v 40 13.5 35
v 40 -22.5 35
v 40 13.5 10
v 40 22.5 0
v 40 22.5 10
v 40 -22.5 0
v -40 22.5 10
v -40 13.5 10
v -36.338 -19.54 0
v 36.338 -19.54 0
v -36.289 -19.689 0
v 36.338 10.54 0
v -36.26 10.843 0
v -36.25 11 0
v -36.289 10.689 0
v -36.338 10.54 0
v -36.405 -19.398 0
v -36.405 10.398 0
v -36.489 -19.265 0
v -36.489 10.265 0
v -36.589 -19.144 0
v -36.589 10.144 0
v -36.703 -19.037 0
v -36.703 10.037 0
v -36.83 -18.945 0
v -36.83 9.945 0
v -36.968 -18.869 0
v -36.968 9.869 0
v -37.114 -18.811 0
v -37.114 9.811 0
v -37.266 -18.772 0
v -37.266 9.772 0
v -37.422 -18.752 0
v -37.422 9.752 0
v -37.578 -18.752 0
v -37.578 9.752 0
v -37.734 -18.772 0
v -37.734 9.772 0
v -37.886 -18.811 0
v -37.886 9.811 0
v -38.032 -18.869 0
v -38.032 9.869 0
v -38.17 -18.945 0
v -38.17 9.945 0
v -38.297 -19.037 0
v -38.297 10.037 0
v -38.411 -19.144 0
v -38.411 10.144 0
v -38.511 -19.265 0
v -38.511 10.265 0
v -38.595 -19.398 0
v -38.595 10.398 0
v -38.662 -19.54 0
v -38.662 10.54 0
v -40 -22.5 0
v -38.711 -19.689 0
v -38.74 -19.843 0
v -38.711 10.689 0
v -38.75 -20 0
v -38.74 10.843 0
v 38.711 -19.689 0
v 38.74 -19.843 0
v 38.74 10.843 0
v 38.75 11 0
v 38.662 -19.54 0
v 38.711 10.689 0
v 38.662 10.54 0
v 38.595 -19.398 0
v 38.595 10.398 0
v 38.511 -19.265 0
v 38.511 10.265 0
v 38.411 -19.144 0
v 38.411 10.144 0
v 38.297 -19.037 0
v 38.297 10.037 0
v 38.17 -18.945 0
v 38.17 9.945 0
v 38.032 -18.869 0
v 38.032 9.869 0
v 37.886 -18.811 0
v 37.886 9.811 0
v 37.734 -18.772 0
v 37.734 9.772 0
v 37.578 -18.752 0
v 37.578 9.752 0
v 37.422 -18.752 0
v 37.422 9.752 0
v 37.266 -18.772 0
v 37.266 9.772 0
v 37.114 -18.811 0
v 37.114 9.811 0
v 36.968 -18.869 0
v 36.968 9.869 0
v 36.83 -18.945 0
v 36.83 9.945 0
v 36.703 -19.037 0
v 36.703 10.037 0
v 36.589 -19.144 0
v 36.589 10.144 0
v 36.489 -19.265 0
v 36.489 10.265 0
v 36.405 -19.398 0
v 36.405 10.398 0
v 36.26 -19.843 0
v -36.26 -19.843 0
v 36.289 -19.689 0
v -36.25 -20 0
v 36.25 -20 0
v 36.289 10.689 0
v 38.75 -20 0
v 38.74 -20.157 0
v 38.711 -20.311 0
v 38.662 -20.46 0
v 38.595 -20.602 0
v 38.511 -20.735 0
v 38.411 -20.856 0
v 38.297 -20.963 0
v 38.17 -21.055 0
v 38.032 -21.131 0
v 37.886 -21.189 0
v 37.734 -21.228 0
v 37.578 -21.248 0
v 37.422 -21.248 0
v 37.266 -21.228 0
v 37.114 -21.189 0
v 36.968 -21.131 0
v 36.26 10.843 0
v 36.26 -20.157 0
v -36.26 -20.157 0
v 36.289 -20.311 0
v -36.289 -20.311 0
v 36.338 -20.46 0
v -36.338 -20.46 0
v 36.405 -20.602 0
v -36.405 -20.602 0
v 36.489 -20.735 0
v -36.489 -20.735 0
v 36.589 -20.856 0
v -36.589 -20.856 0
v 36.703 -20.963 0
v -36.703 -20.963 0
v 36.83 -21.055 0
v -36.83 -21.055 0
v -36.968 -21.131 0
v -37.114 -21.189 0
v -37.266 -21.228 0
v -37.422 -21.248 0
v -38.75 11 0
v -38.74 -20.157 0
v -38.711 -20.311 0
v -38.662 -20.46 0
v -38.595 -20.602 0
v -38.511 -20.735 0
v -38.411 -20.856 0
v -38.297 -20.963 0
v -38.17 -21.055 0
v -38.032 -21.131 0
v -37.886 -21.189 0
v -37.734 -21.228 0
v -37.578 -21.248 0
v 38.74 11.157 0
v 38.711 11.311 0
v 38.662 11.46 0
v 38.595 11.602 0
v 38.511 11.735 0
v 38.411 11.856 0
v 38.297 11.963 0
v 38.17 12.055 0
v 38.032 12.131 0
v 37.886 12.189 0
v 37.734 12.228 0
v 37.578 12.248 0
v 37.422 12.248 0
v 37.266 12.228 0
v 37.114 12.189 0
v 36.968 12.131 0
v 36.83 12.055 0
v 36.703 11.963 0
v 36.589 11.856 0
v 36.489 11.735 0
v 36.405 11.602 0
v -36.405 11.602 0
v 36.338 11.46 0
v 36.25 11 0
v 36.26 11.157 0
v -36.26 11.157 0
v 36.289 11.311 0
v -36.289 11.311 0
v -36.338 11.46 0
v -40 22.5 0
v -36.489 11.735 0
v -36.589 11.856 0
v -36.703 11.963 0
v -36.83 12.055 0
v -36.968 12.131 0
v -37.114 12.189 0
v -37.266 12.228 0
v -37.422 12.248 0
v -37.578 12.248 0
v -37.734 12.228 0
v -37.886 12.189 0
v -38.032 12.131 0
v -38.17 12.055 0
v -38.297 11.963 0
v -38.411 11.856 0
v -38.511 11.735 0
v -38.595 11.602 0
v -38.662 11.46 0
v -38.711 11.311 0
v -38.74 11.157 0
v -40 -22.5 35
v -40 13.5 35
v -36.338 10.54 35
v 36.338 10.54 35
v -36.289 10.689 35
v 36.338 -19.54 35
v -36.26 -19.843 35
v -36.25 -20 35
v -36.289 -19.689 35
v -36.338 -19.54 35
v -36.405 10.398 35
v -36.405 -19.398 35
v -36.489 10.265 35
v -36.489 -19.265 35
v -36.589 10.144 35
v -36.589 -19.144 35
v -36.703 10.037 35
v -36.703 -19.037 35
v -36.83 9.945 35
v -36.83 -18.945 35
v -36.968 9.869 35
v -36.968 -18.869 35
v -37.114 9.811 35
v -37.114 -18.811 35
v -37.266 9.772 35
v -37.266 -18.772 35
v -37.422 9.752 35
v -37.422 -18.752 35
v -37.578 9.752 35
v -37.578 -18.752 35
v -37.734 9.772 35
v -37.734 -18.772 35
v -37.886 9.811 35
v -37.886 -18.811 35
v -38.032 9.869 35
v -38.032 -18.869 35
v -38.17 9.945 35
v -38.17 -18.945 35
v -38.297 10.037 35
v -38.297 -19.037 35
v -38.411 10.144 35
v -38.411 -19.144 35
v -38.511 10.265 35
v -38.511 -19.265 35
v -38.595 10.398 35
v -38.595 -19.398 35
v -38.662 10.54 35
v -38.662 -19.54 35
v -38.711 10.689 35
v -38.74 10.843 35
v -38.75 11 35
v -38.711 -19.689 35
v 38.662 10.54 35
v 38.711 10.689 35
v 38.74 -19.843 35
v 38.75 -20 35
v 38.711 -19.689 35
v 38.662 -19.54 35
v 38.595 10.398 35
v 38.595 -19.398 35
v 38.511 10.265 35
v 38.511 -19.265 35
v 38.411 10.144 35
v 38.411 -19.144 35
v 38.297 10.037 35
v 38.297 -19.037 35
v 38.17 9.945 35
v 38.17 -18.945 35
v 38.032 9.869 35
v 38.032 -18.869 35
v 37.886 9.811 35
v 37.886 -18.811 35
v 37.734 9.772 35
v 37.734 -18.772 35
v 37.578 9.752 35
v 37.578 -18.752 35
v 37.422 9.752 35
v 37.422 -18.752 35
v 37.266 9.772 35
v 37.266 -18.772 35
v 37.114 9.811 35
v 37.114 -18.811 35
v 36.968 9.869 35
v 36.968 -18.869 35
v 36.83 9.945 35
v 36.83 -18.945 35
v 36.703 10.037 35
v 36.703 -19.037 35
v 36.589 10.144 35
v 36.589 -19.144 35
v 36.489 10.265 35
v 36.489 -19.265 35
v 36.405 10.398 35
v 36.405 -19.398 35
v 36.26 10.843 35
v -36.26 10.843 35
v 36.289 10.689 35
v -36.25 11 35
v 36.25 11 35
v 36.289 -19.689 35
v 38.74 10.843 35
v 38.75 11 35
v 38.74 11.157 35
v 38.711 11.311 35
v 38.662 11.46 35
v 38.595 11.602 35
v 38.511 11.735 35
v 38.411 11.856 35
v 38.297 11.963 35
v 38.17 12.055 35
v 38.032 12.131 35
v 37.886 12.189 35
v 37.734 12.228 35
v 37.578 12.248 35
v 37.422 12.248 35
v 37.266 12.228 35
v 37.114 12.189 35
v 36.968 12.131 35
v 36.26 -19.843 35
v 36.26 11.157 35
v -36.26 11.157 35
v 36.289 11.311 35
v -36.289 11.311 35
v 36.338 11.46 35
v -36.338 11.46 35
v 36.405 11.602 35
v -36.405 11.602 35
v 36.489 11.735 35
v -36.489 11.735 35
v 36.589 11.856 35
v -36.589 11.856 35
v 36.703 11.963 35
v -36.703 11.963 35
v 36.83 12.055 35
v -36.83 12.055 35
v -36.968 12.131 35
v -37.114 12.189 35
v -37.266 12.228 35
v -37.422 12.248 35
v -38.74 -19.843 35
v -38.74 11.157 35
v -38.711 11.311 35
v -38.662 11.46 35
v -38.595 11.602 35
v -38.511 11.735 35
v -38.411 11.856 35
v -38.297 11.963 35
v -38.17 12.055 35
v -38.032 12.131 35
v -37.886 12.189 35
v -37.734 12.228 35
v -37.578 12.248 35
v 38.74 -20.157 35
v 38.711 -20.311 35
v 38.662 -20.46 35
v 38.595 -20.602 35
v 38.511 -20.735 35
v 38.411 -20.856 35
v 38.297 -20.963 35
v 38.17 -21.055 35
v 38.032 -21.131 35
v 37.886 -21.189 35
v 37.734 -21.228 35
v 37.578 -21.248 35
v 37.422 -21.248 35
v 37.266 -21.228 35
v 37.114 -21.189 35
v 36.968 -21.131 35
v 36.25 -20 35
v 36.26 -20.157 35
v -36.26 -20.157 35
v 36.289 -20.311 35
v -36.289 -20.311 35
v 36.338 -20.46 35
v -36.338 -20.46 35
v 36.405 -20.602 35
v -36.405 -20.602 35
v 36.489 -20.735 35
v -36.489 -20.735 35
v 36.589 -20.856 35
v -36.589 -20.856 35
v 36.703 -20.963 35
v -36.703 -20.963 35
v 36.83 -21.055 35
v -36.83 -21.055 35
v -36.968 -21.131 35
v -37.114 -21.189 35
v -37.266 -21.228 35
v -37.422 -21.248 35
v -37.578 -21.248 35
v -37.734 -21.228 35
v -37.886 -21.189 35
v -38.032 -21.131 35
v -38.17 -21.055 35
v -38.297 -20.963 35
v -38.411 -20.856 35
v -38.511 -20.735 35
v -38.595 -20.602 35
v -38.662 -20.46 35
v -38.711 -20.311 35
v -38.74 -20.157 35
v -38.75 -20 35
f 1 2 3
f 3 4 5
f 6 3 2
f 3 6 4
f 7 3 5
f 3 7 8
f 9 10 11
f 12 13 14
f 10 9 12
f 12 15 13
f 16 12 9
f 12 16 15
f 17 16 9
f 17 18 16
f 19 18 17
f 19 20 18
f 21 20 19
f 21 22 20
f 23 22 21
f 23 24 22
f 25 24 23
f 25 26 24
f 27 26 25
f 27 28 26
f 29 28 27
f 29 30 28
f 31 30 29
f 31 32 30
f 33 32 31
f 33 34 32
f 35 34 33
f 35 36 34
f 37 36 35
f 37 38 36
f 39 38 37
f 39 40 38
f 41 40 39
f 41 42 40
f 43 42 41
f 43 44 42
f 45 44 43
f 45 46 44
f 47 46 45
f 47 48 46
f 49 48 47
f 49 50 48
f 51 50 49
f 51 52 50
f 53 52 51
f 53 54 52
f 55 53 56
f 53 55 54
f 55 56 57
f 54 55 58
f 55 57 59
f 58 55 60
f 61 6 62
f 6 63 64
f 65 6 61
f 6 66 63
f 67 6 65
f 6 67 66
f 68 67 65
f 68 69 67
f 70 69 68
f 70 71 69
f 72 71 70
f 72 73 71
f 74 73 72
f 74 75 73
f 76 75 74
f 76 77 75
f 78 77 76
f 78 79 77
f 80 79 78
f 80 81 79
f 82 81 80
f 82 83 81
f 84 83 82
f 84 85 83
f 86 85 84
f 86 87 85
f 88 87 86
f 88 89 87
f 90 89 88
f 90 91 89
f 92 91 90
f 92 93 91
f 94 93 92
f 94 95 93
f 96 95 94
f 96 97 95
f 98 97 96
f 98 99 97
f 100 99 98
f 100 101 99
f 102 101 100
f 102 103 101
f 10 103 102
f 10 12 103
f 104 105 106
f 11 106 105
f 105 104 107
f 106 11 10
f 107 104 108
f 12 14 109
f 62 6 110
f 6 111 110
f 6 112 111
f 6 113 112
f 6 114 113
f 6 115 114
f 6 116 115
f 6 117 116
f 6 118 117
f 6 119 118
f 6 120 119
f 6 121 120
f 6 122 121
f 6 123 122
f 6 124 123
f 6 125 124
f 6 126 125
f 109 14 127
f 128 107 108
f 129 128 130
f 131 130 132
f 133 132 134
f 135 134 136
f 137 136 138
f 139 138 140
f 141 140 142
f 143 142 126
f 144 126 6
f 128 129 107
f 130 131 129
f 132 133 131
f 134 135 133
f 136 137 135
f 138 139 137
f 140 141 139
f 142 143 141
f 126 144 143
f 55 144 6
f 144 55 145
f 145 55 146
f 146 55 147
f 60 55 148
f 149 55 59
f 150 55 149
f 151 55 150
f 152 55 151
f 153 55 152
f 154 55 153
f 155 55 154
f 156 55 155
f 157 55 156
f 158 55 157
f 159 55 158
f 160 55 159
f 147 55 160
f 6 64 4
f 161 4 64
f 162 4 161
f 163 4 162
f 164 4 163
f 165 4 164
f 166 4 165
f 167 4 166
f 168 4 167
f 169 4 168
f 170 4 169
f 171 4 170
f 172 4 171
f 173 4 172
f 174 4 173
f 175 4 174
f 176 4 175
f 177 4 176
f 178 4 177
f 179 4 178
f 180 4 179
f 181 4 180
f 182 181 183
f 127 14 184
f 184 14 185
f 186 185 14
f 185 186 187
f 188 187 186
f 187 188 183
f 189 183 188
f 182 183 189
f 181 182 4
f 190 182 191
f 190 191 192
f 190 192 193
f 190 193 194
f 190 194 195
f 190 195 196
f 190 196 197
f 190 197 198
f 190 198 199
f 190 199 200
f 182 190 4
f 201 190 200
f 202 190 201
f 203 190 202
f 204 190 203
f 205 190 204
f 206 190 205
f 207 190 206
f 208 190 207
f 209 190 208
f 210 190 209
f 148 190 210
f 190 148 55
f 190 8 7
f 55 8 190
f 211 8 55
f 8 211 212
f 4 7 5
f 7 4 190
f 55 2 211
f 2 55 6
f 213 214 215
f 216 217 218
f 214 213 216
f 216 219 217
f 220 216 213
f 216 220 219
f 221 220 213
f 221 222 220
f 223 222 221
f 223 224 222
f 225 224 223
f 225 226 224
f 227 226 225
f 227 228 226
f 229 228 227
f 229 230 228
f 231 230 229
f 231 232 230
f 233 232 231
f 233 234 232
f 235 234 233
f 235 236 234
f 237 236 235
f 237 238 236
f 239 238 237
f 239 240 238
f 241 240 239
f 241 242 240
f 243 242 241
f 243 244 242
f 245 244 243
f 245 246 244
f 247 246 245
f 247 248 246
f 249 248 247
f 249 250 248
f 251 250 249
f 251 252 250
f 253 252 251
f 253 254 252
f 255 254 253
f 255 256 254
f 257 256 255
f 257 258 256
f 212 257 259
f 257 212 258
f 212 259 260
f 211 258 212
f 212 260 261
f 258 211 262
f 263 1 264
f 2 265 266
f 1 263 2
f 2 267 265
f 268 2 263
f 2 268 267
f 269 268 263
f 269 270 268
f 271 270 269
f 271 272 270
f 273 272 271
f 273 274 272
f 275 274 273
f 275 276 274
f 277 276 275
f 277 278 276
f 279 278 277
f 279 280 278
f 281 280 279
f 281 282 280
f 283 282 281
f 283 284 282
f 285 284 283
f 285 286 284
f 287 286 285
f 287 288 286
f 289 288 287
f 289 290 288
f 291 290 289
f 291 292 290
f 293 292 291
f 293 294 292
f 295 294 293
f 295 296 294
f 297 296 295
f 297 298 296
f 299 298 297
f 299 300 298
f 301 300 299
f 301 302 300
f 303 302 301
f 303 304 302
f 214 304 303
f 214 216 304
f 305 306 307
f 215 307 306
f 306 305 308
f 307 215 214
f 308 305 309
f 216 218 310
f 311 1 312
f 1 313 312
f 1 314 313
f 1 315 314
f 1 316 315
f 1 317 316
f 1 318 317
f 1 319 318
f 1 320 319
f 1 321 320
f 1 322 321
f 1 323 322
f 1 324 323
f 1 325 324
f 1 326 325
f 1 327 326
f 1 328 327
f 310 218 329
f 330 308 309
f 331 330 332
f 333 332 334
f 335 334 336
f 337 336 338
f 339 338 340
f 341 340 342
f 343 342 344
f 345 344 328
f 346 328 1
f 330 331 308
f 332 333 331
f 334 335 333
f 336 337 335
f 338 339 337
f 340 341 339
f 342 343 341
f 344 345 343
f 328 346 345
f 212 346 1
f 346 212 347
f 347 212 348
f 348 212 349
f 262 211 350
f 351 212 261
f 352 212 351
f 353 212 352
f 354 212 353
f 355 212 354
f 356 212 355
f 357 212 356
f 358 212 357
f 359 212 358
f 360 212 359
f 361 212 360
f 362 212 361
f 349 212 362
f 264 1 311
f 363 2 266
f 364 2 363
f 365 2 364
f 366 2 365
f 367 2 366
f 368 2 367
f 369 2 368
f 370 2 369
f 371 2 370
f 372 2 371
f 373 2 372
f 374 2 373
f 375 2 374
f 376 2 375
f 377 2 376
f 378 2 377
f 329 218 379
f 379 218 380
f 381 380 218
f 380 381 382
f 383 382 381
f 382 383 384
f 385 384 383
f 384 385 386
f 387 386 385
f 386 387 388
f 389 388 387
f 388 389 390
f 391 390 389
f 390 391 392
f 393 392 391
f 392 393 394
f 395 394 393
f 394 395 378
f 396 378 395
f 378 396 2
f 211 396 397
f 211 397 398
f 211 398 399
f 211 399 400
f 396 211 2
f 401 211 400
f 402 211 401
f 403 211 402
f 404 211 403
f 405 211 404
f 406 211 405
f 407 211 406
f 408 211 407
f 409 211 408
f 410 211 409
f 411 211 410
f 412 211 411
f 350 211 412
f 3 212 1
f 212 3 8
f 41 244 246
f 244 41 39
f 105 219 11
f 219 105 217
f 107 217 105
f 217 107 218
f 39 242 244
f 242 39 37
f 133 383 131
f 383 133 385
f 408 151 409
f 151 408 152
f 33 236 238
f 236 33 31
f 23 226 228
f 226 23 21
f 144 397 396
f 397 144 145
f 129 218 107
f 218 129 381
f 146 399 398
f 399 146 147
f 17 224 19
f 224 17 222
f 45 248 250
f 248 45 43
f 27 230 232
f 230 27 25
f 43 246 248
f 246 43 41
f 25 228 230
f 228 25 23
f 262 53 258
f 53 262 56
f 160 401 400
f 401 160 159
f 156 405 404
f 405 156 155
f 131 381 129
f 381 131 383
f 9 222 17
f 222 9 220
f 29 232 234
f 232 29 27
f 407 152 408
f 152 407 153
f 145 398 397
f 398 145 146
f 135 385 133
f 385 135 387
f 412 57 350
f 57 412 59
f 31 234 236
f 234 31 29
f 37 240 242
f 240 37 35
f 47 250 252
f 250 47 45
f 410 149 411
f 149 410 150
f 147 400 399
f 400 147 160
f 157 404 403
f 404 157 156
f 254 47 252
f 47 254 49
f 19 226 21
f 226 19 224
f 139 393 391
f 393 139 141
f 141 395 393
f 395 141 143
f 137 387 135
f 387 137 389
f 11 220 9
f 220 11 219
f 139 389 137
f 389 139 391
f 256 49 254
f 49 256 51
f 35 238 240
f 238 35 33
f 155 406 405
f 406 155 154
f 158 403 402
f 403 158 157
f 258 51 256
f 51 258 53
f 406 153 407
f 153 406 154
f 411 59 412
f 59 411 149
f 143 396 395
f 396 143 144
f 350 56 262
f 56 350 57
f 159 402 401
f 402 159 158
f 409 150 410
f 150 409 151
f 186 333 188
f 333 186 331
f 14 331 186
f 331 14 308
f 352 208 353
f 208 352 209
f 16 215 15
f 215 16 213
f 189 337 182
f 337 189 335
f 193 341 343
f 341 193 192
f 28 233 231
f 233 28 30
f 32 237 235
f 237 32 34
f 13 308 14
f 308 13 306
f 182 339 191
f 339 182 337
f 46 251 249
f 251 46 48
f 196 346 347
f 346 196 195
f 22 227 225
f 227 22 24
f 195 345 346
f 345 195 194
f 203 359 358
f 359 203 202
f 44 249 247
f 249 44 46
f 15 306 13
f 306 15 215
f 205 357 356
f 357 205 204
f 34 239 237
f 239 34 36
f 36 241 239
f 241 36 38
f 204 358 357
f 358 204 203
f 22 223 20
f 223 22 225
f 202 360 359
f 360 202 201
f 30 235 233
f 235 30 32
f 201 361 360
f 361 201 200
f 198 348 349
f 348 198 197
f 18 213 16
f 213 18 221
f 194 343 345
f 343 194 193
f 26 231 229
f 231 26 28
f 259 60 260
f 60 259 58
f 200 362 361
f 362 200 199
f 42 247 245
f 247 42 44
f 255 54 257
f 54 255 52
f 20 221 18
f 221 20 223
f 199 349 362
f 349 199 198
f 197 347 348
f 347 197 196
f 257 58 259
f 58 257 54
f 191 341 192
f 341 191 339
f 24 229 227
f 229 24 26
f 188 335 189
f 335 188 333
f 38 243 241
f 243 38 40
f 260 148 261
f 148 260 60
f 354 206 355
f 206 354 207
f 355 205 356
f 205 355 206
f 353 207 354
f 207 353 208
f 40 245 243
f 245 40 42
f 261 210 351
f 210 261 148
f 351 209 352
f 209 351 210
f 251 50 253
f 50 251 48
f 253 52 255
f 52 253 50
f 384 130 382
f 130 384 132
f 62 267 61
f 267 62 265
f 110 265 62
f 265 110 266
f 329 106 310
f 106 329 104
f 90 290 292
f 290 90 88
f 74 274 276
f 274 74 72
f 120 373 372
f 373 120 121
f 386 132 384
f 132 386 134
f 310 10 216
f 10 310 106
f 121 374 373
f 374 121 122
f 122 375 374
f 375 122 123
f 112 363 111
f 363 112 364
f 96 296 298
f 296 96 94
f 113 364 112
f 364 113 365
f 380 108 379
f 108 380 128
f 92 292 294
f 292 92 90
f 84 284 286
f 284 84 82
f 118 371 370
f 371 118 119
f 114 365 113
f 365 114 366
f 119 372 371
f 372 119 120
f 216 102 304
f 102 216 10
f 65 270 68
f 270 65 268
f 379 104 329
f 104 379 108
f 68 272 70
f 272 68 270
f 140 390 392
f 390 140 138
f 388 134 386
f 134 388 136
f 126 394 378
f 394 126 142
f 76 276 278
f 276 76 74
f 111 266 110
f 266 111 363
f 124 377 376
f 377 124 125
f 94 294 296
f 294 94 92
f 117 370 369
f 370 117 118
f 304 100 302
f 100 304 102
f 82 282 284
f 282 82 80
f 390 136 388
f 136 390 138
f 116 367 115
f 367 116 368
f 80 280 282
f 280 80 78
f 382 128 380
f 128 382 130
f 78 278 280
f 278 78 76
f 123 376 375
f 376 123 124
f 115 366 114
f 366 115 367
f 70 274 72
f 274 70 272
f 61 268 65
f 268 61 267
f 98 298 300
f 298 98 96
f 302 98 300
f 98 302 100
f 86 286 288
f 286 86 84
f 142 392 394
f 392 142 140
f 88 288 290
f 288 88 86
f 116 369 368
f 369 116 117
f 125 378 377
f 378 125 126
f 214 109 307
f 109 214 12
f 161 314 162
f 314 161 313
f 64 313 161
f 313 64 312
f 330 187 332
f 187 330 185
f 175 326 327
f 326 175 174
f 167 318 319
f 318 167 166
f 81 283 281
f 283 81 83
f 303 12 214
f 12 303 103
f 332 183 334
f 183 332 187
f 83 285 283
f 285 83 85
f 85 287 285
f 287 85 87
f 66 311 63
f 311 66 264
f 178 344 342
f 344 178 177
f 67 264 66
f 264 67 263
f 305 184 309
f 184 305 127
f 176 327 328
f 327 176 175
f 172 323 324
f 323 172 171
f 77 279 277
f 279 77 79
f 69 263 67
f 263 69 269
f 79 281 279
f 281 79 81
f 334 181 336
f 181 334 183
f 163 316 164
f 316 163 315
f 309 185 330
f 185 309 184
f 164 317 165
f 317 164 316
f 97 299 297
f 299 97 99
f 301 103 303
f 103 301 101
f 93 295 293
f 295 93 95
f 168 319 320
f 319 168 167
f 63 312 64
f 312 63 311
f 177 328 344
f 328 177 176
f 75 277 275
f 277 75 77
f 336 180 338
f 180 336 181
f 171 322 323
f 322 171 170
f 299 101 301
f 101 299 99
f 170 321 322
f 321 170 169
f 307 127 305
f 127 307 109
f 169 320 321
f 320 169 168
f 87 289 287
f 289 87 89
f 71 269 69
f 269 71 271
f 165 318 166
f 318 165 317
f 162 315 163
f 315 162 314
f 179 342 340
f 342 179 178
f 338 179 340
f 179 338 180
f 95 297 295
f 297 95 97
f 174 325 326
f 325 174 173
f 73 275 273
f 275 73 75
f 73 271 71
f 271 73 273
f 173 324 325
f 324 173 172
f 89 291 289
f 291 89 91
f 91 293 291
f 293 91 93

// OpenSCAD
//Board outer dimensions
gc_l_at324 = 80.0;
gc_w_at324 = 45.0;
gc_t_at324 = 10.0;
//The LCD board is above and aligned
gc_w_at324_lcd = 36.0;
gc_t_at324_lcd = 35.0;
//Board Hole interaxis
gc_d_at324_hole = 2.5+0.0;
gc_li_at324_hole = 75.0;
gc_wi_at324_hole = 31.0;

module at324_board
(
	//PCB Connectors Components
	i_l_board = gc_l_at324,
	i_w_board = gc_w_at324,
	i_t_board = gc_t_at324,
	//LCD and separation
	i_w_lcd = gc_w_at324_lcd,
	i_t_lcd = gc_t_at324_lcd,
	//Hole diameter
	i_d_hole = gc_d_at324_hole,
	//Hole interaxis
	i_li_hole = gc_li_at324_hole,
	i_wi_hole = gc_wi_at324_hole
)
{

	difference()
	{
		union()
		{
			//PCB Connectors Components
			color("#00ff00")
			translate([-i_l_board/2,-i_w_board/2,0])
			cube
			([
				i_l_board,
				i_w_board,
				i_t_board
			]);
			//LCD and separation
			color("#00ffff")
			translate([-i_l_board/2,-i_w_board/2,0])
			translate([0,0,i_t_board])
			cube
			([
				i_l_board,
				i_w_lcd,
				i_t_lcd-i_t_board
			]);
		}
		union()
		{
			for (lo_temp=[-i_li_hole/2,i_li_hole/2])
			for (wo_temp=[-i_wi_hole/2,i_wi_hole/2])
			{
				translate
				([
					lo_temp,	
					wo_temp - (i_w_board-i_w_lcd) / 2,
					0
				])
				cylinder
				(
					d = i_d_hole,
					h = i_t_board +i_t_lcd,
					$fn = 50
				);
			}

		}
	}
}

//if (false)
at324_board();
